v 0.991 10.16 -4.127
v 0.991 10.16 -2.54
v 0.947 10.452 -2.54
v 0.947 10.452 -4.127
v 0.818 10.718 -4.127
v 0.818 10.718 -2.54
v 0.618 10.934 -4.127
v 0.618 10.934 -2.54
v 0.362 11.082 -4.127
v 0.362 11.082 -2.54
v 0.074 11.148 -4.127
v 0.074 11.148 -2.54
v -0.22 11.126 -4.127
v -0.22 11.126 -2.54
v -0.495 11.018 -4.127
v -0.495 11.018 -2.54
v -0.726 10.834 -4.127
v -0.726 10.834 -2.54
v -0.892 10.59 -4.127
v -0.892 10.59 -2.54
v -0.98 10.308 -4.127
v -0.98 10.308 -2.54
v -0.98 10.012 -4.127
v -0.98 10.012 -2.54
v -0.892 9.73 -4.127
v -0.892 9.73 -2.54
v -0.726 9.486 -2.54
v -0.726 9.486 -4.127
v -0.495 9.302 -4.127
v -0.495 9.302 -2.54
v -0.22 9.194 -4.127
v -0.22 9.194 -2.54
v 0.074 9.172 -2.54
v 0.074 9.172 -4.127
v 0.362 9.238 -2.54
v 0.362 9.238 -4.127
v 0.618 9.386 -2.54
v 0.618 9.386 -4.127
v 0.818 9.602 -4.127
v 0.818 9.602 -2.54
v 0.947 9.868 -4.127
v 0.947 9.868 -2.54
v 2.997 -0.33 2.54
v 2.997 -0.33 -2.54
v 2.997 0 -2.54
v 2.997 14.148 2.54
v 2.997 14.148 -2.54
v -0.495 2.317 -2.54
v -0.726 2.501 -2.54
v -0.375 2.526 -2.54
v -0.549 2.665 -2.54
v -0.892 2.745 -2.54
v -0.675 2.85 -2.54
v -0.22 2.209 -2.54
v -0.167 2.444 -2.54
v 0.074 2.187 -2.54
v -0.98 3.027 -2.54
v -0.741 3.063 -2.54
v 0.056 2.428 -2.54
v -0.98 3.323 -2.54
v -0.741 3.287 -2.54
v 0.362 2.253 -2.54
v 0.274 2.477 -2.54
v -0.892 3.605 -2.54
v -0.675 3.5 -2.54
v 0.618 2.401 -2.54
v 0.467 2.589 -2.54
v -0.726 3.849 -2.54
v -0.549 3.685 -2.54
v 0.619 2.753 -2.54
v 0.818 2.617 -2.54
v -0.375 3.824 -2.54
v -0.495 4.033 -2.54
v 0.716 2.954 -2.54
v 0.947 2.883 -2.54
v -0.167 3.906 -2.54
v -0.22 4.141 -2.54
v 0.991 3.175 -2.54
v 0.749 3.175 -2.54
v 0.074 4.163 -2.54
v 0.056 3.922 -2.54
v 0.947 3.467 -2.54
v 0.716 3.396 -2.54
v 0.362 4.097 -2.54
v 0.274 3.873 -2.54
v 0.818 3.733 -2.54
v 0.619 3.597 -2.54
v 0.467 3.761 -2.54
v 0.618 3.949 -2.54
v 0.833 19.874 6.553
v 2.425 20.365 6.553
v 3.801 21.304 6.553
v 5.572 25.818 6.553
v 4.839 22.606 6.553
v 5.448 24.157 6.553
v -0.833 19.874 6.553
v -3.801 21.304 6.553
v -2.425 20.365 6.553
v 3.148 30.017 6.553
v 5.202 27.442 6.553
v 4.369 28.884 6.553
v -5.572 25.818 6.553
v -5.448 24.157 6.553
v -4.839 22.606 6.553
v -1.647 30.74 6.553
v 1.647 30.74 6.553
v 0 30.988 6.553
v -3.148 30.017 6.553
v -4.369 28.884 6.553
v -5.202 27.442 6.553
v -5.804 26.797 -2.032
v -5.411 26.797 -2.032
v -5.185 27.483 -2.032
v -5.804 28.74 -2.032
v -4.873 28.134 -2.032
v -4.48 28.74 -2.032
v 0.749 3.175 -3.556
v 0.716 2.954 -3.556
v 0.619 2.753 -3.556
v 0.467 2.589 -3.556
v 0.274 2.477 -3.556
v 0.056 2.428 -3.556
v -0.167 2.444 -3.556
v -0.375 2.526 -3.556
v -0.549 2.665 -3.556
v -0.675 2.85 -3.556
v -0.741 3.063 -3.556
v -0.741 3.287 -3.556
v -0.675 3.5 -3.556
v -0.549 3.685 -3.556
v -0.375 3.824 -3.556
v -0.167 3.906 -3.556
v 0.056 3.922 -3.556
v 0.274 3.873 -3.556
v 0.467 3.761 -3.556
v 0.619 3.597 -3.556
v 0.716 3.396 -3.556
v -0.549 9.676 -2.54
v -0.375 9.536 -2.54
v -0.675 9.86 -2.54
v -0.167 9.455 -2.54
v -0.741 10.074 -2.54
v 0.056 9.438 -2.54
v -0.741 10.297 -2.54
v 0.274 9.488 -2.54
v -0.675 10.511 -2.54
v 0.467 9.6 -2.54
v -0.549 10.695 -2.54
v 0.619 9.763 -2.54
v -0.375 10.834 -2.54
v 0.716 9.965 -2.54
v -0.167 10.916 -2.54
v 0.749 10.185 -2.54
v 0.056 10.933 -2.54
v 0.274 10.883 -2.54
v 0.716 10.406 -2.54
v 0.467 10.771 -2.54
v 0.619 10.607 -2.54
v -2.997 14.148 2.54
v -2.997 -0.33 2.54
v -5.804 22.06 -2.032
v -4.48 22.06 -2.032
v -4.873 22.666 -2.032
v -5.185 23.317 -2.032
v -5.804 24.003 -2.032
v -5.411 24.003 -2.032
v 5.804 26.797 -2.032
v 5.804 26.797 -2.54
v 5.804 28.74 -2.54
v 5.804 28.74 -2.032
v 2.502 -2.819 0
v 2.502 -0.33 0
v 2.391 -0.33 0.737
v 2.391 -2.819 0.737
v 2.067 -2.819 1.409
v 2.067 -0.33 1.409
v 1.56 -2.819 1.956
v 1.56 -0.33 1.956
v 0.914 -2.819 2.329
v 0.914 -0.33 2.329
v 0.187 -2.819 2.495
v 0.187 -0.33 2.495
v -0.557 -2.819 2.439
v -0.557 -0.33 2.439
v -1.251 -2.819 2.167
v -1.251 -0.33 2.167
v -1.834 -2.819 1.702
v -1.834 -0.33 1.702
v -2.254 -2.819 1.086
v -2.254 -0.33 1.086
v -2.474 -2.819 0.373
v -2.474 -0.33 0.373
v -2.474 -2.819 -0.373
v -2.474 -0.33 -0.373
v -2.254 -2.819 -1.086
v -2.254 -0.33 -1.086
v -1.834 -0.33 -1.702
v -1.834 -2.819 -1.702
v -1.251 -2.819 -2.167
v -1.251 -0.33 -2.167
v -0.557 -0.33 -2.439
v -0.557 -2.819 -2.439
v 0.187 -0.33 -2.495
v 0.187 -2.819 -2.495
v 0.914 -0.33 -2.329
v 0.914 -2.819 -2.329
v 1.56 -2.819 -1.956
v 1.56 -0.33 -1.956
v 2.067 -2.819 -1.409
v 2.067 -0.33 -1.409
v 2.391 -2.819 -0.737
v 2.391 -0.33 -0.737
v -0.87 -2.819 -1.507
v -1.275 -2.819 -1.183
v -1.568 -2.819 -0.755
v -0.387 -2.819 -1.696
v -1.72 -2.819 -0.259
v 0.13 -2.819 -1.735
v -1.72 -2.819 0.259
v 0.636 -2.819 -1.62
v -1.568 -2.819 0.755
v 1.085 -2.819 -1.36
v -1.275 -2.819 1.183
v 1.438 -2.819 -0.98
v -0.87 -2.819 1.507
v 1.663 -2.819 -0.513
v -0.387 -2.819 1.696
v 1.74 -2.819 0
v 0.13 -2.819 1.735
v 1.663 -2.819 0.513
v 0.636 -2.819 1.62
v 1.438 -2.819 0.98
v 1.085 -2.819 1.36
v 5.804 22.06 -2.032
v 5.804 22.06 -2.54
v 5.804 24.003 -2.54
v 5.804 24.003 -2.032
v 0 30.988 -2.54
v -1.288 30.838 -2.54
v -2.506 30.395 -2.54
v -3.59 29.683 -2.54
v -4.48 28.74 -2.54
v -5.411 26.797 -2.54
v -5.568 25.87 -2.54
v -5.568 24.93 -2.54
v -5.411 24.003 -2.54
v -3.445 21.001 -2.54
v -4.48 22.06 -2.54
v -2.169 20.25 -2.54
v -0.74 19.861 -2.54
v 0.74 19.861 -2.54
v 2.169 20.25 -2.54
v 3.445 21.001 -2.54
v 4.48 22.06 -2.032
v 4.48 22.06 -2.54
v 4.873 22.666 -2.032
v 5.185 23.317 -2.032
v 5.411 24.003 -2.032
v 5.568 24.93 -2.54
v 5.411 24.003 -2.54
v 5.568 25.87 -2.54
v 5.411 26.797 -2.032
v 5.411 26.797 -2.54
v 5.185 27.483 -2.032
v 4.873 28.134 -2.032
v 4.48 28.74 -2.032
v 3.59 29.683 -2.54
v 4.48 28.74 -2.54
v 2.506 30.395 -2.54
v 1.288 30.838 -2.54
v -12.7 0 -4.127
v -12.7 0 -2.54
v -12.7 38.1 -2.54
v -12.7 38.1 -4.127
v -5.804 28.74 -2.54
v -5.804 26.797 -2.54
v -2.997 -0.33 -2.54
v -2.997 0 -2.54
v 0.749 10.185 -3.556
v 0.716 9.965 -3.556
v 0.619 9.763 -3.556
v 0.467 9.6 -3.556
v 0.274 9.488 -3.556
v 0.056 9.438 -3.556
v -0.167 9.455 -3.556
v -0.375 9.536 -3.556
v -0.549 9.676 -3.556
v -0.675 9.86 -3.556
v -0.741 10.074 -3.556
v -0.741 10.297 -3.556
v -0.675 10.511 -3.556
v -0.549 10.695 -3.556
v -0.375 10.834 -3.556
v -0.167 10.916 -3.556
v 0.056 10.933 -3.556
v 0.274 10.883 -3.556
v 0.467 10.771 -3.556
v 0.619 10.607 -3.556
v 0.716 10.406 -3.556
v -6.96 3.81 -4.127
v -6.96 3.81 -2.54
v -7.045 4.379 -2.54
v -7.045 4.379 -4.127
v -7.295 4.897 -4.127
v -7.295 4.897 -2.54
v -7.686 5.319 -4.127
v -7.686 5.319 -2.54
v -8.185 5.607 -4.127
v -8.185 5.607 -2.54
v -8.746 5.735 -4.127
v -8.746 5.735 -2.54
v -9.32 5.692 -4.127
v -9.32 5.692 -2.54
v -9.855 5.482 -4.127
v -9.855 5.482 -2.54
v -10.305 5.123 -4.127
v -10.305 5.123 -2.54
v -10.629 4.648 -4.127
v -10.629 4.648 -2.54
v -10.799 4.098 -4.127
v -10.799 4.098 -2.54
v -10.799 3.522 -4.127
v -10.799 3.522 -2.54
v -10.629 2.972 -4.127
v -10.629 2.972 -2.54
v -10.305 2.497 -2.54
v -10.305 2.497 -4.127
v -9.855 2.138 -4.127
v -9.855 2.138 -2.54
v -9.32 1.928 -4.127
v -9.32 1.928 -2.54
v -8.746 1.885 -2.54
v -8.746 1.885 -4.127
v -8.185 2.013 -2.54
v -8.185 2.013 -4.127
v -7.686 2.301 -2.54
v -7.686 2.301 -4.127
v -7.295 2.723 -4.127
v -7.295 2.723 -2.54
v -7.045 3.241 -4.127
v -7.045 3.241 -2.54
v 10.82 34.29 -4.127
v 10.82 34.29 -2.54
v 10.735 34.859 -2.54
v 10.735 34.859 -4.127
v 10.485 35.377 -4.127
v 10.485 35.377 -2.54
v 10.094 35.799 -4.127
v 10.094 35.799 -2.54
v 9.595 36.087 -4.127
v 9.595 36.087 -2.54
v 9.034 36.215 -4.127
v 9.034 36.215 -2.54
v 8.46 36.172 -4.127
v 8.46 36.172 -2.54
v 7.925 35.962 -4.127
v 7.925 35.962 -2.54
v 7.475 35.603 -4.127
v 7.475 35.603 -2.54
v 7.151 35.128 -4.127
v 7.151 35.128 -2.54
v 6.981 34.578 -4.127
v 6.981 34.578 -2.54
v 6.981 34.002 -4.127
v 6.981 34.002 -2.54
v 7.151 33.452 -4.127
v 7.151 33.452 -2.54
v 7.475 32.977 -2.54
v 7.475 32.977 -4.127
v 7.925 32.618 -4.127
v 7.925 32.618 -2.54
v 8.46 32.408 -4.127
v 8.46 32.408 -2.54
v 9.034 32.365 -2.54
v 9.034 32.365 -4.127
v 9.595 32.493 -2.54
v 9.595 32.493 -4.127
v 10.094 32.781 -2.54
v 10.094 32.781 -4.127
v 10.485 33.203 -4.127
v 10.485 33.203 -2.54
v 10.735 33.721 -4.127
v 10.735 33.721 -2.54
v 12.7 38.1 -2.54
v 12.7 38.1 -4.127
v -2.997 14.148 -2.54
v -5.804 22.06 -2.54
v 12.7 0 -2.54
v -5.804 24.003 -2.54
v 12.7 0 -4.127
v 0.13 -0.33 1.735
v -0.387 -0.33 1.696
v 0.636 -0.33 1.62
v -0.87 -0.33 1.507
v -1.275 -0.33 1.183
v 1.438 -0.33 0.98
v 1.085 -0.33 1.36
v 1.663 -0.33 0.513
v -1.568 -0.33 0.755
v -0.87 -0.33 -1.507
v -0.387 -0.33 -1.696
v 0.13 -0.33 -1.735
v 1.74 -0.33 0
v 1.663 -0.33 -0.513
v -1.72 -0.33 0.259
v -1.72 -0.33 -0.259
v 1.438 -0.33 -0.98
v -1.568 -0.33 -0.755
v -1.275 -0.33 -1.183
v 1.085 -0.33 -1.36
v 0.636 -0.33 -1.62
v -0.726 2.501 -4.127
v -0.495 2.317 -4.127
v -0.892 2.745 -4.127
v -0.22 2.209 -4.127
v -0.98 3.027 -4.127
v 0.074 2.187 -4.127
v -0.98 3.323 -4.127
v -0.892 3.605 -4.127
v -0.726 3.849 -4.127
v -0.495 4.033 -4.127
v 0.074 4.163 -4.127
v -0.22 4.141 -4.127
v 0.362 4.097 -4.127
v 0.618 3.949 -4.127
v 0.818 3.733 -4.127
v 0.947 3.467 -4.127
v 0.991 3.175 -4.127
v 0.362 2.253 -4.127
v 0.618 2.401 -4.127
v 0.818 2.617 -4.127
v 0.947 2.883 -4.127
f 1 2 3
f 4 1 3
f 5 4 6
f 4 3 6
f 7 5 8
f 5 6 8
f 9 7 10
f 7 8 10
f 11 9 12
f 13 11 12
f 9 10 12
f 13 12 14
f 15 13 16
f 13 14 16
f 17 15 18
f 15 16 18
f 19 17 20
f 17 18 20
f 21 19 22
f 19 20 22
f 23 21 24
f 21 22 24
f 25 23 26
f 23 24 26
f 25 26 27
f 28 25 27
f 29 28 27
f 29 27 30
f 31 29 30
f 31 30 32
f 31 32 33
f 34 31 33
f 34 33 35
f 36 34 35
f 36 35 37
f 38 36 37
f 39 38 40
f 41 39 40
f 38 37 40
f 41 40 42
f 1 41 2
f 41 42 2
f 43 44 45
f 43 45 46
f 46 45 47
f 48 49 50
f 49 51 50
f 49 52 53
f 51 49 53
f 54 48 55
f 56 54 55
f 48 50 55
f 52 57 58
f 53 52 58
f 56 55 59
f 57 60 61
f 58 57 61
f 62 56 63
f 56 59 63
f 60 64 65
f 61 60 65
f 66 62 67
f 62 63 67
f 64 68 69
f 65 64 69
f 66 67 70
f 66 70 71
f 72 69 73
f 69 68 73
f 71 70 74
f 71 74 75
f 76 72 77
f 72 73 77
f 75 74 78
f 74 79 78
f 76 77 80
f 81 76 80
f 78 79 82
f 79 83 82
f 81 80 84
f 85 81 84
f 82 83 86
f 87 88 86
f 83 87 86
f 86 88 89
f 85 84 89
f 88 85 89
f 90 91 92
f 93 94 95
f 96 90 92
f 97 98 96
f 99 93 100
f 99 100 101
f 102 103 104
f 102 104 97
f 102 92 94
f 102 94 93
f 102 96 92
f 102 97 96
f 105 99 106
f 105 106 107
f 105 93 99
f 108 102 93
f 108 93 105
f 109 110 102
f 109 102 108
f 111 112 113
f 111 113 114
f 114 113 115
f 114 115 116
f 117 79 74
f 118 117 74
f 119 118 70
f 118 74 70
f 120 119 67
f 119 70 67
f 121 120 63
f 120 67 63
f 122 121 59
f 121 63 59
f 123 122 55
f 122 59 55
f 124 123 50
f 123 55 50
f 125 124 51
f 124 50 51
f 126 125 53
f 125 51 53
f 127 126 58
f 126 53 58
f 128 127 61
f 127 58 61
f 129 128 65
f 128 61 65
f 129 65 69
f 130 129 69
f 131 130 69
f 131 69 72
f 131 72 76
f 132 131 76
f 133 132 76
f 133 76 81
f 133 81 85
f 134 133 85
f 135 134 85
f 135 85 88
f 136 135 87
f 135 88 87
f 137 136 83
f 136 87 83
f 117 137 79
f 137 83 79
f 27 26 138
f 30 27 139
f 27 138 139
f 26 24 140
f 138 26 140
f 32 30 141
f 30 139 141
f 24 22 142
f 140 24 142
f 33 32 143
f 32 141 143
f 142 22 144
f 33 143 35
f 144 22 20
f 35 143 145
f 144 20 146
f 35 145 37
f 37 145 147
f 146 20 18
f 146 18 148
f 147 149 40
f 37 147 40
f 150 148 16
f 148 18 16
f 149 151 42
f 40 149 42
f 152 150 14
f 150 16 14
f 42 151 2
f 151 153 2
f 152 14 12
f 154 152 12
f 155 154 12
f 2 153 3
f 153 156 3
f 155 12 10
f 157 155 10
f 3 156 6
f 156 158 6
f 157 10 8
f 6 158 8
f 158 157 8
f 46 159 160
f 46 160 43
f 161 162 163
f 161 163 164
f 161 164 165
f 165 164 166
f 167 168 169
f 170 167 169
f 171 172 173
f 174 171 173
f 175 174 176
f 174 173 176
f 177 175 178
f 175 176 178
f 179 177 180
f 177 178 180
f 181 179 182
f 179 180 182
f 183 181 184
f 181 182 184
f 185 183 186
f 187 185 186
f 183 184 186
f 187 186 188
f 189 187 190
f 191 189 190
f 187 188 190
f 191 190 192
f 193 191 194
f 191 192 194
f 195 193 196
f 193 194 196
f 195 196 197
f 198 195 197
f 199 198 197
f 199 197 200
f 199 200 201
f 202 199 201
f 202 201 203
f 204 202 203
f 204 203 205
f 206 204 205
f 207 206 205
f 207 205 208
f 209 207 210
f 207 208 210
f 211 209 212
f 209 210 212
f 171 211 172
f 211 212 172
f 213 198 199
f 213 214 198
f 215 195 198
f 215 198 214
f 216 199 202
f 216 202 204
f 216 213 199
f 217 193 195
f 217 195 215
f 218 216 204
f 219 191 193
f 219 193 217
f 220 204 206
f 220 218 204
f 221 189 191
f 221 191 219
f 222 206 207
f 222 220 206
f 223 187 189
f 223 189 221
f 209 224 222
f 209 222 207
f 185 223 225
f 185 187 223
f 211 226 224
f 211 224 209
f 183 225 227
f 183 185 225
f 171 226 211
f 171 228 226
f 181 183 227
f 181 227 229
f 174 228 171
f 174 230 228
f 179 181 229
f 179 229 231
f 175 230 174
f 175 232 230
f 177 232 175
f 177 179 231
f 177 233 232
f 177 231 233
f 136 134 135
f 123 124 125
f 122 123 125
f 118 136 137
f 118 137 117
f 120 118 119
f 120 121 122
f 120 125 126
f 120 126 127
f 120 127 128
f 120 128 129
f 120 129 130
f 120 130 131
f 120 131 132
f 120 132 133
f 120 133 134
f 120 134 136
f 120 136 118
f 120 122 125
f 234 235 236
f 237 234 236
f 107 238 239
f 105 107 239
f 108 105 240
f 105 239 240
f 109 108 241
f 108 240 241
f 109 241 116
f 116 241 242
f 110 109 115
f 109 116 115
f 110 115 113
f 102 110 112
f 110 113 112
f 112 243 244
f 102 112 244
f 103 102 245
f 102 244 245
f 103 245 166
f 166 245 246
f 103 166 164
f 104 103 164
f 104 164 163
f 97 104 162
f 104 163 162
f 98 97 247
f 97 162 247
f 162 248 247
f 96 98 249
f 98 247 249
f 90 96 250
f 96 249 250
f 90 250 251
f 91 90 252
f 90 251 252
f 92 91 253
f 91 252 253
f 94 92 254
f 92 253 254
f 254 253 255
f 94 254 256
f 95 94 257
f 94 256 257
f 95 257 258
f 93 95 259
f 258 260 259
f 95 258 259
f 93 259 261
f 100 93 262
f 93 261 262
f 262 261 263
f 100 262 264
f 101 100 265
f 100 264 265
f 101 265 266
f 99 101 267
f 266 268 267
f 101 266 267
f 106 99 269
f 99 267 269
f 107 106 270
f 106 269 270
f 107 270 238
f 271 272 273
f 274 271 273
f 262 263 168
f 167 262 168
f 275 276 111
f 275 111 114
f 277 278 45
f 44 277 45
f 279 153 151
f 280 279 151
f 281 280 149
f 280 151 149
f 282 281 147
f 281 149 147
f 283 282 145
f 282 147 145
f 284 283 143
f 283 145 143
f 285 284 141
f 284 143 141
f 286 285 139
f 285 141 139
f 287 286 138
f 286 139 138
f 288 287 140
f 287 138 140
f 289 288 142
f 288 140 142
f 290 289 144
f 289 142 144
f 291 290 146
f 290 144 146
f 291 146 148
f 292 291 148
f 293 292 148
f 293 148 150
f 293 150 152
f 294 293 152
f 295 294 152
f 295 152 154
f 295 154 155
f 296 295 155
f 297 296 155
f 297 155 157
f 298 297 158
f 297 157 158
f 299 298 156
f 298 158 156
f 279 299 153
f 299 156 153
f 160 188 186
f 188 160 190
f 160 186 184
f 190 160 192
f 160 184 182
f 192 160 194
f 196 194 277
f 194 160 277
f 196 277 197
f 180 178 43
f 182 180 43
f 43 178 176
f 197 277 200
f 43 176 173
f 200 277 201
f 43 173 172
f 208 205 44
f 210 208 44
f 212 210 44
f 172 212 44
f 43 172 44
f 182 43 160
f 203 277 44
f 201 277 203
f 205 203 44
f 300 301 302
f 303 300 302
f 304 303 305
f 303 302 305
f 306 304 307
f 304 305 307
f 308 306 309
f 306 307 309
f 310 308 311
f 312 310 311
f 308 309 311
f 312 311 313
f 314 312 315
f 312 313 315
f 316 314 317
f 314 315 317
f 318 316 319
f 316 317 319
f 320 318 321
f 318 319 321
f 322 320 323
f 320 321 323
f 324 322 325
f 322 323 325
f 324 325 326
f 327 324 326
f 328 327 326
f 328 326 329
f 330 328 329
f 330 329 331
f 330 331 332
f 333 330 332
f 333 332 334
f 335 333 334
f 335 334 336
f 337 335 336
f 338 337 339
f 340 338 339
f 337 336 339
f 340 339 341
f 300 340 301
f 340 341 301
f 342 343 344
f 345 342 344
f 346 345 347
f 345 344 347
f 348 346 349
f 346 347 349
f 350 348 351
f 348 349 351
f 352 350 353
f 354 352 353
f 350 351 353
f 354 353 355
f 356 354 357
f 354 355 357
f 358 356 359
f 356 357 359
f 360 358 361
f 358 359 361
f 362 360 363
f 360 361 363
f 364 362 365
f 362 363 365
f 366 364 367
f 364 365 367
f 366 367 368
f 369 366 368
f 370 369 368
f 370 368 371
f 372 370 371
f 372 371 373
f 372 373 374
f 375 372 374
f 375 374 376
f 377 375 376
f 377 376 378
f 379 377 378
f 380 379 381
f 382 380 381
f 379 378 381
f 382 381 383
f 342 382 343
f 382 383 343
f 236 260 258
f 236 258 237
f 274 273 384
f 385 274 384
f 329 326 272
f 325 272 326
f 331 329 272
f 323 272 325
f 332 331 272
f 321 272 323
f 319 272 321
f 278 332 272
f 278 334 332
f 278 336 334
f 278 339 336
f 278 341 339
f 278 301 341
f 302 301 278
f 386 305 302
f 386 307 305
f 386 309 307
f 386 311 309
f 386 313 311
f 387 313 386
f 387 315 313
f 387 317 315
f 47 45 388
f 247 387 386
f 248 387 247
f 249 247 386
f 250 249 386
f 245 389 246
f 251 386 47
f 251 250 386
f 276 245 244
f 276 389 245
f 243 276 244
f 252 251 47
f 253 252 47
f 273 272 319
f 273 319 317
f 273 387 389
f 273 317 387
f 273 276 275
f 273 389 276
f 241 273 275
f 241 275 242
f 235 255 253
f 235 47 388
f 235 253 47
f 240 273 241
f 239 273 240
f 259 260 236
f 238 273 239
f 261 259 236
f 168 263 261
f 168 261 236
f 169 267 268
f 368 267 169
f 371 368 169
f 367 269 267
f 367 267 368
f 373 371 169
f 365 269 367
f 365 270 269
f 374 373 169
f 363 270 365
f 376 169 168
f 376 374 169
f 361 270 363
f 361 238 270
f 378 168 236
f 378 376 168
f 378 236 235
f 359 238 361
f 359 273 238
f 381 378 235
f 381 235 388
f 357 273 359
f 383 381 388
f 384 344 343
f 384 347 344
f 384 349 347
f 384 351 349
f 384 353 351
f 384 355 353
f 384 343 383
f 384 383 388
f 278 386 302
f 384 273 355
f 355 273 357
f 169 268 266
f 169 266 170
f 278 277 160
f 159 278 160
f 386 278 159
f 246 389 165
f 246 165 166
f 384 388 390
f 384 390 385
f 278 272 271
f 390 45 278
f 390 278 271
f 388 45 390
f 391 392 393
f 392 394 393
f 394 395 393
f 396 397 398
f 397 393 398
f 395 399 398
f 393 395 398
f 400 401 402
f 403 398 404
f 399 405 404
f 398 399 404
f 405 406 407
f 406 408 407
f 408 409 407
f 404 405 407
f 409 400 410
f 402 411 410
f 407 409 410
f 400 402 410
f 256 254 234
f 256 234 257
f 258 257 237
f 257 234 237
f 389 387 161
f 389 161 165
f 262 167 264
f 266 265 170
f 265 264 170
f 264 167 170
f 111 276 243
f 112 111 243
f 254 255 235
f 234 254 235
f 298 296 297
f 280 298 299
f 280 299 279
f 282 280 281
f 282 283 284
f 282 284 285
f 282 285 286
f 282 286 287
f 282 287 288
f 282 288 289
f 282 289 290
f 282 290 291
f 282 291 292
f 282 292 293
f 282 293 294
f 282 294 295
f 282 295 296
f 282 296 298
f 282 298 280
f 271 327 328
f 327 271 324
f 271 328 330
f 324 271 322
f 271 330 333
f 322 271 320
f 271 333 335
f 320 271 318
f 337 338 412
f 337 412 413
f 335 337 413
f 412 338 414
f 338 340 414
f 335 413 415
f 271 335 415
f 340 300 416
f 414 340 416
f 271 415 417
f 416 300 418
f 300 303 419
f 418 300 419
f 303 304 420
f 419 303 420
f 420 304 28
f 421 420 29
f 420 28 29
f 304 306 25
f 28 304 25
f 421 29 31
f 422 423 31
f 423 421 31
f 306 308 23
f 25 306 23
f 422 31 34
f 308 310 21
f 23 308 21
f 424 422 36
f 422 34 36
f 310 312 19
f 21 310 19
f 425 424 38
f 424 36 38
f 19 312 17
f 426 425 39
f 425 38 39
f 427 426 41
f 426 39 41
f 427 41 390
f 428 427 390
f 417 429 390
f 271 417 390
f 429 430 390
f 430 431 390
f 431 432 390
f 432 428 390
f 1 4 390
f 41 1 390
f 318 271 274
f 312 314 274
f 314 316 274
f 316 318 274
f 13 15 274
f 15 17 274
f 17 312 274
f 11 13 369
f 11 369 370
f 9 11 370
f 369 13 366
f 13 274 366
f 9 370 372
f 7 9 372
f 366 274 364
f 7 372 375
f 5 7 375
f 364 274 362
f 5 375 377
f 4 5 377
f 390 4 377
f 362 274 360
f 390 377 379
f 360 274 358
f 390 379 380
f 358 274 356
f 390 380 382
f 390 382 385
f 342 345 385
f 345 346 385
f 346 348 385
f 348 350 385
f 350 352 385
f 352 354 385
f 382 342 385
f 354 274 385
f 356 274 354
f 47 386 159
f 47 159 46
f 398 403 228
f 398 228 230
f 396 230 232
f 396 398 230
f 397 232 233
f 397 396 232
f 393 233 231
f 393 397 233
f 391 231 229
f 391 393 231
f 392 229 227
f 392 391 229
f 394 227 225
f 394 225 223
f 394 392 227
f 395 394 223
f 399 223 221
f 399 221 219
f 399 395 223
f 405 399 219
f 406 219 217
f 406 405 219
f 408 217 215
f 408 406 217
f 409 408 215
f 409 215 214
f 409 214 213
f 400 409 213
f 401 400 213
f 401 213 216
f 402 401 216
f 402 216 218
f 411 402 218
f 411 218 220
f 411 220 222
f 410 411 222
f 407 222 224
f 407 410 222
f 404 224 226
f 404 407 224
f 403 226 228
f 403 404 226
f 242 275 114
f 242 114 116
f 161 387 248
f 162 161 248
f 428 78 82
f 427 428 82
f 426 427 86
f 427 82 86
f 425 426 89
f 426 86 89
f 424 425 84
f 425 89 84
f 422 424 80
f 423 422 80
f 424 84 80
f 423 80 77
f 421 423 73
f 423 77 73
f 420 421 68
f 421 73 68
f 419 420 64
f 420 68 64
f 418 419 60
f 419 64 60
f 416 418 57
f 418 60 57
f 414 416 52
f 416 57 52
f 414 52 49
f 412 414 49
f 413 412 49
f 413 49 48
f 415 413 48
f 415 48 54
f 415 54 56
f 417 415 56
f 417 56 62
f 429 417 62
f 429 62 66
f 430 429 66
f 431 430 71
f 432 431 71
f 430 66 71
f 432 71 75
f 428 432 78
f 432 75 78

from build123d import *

# Parameters (mm, degrees)
SKETCH003_R             = 5.588
PAD003_DEPTH            = 9.0932
SKETCH004_W             = 1.9431
SKETCH004_H             = 3.2639
PAD004_DEPTH            = 0.508
BODY003_PLACEMENT_ANGLE = 90
SKETCH005_W             = 25.4
SKETCH005_H             = 38.1
SKETCH005_R             = 1.9304
SKETCH005_R_2           = 0.9906
PAD005_DEPTH            = 1.5875
SKETCH_W                = 5.9944
SKETCH_H                = 14.478
PAD_DEPTH               = 5.08
SKETCH001_R             = 2.5019
SKETCH001_R_2           = 1.7399
PAD001_DEPTH            = 2.4892
SKETCH002_R             = 0.7493
PAD002_DEPTH            = 1.016


with BuildPart() as switch_clone:
    # Sketch003 → Pad003 (new body)
    with BuildSketch(Plane.XY):
        Circle(SKETCH003_R)
    extrude(amount=PAD003_DEPTH)

    # Sketch004 (on Face2 of Pad003) → Pad004 (join)
    with BuildSketch(Plane(origin=(0, 0, 0), x_dir=(1, 0, 0), z_dir=(0, 0, -1))):
        with Locations((-2.36855, 4.17195)):
            Rectangle(SKETCH004_W, SKETCH004_H)
        with Locations((2.36855, 4.17195)):
            Rectangle(SKETCH004_W, SKETCH004_H)
        with Locations((2.36855, -4.17195)):
            Rectangle(SKETCH004_W, SKETCH004_H)
        with Locations((-2.36855, -4.17195)):
            Rectangle(SKETCH004_W, SKETCH004_H)
    extrude(amount=-PAD004_DEPTH)


with BuildPart() as switch_clone_1:
    # Body003 placement: moved
    add(switch_clone.part.moved(Location((0, 25.4, 0))).rotate(Axis((0, 25.4, 0), (0, 0, 1)), BODY003_PLACEMENT_ANGLE))


with BuildPart() as bare_pcb_clone:
    # Sketch005 → Pad005 (new body)
    with BuildSketch(Plane.XY):
        with Locations((0, 19.05)):
            Rectangle(SKETCH005_W, SKETCH005_H)
        with Locations((-8.89, 3.81)):
            Circle(SKETCH005_R, mode=Mode.SUBTRACT)
        with Locations((8.89, 34.29)):
            Circle(SKETCH005_R, mode=Mode.SUBTRACT)
        with Locations((0, 3.175)):
            Circle(SKETCH005_R_2, mode=Mode.SUBTRACT)
        with Locations((0, 10.16)):
            Circle(SKETCH005_R_2, mode=Mode.SUBTRACT)
    extrude(amount=-PAD005_DEPTH)


with BuildPart() as populated_pcb_clone:
    # Sketch → Pad (new body)
    with BuildSketch(Plane.XY):
        with Locations((0, 7.239)):
            Rectangle(SKETCH_W, SKETCH_H)
    extrude(amount=PAD_DEPTH)

    # Sketch001 (on Face3 of Pad) → Pad001 (join)
    with BuildSketch(Plane.XZ):
        with Locations((0, 2.54)):
            Circle(SKETCH001_R)
        with Locations((0, 2.54)):
            Circle(SKETCH001_R_2, mode=Mode.SUBTRACT)
    extrude(amount=PAD001_DEPTH)

    # Sketch002 (on Face4 of Pad001) → Pad002 (join)
    with BuildSketch(Plane(origin=(0, 0, 0), x_dir=(1, 0, 0), z_dir=(0, 0, -1))):
        with Locations((0, -3.5052)):
            Circle(SKETCH002_R)
        with Locations((0, -10.5156)):
            Circle(SKETCH002_R)
    extrude(amount=PAD002_DEPTH)


with BuildPart() as populated_pcb_clone_1:
    # Body002 placement: moved
    add(populated_pcb_clone.part.moved(Location((0, -0.3302, 0))))

    # Fusion: union switch clone, bare pcb clone
    add(switch_clone_1.part)
    add(bare_pcb_clone.part)


with BuildPart() as populated_pcb_clone_2:
    # Body006 placement: moved
    add(populated_pcb_clone_1.part.moved(Location((0, 0, -2.54))))


solid = populated_pcb_clone_2.part
